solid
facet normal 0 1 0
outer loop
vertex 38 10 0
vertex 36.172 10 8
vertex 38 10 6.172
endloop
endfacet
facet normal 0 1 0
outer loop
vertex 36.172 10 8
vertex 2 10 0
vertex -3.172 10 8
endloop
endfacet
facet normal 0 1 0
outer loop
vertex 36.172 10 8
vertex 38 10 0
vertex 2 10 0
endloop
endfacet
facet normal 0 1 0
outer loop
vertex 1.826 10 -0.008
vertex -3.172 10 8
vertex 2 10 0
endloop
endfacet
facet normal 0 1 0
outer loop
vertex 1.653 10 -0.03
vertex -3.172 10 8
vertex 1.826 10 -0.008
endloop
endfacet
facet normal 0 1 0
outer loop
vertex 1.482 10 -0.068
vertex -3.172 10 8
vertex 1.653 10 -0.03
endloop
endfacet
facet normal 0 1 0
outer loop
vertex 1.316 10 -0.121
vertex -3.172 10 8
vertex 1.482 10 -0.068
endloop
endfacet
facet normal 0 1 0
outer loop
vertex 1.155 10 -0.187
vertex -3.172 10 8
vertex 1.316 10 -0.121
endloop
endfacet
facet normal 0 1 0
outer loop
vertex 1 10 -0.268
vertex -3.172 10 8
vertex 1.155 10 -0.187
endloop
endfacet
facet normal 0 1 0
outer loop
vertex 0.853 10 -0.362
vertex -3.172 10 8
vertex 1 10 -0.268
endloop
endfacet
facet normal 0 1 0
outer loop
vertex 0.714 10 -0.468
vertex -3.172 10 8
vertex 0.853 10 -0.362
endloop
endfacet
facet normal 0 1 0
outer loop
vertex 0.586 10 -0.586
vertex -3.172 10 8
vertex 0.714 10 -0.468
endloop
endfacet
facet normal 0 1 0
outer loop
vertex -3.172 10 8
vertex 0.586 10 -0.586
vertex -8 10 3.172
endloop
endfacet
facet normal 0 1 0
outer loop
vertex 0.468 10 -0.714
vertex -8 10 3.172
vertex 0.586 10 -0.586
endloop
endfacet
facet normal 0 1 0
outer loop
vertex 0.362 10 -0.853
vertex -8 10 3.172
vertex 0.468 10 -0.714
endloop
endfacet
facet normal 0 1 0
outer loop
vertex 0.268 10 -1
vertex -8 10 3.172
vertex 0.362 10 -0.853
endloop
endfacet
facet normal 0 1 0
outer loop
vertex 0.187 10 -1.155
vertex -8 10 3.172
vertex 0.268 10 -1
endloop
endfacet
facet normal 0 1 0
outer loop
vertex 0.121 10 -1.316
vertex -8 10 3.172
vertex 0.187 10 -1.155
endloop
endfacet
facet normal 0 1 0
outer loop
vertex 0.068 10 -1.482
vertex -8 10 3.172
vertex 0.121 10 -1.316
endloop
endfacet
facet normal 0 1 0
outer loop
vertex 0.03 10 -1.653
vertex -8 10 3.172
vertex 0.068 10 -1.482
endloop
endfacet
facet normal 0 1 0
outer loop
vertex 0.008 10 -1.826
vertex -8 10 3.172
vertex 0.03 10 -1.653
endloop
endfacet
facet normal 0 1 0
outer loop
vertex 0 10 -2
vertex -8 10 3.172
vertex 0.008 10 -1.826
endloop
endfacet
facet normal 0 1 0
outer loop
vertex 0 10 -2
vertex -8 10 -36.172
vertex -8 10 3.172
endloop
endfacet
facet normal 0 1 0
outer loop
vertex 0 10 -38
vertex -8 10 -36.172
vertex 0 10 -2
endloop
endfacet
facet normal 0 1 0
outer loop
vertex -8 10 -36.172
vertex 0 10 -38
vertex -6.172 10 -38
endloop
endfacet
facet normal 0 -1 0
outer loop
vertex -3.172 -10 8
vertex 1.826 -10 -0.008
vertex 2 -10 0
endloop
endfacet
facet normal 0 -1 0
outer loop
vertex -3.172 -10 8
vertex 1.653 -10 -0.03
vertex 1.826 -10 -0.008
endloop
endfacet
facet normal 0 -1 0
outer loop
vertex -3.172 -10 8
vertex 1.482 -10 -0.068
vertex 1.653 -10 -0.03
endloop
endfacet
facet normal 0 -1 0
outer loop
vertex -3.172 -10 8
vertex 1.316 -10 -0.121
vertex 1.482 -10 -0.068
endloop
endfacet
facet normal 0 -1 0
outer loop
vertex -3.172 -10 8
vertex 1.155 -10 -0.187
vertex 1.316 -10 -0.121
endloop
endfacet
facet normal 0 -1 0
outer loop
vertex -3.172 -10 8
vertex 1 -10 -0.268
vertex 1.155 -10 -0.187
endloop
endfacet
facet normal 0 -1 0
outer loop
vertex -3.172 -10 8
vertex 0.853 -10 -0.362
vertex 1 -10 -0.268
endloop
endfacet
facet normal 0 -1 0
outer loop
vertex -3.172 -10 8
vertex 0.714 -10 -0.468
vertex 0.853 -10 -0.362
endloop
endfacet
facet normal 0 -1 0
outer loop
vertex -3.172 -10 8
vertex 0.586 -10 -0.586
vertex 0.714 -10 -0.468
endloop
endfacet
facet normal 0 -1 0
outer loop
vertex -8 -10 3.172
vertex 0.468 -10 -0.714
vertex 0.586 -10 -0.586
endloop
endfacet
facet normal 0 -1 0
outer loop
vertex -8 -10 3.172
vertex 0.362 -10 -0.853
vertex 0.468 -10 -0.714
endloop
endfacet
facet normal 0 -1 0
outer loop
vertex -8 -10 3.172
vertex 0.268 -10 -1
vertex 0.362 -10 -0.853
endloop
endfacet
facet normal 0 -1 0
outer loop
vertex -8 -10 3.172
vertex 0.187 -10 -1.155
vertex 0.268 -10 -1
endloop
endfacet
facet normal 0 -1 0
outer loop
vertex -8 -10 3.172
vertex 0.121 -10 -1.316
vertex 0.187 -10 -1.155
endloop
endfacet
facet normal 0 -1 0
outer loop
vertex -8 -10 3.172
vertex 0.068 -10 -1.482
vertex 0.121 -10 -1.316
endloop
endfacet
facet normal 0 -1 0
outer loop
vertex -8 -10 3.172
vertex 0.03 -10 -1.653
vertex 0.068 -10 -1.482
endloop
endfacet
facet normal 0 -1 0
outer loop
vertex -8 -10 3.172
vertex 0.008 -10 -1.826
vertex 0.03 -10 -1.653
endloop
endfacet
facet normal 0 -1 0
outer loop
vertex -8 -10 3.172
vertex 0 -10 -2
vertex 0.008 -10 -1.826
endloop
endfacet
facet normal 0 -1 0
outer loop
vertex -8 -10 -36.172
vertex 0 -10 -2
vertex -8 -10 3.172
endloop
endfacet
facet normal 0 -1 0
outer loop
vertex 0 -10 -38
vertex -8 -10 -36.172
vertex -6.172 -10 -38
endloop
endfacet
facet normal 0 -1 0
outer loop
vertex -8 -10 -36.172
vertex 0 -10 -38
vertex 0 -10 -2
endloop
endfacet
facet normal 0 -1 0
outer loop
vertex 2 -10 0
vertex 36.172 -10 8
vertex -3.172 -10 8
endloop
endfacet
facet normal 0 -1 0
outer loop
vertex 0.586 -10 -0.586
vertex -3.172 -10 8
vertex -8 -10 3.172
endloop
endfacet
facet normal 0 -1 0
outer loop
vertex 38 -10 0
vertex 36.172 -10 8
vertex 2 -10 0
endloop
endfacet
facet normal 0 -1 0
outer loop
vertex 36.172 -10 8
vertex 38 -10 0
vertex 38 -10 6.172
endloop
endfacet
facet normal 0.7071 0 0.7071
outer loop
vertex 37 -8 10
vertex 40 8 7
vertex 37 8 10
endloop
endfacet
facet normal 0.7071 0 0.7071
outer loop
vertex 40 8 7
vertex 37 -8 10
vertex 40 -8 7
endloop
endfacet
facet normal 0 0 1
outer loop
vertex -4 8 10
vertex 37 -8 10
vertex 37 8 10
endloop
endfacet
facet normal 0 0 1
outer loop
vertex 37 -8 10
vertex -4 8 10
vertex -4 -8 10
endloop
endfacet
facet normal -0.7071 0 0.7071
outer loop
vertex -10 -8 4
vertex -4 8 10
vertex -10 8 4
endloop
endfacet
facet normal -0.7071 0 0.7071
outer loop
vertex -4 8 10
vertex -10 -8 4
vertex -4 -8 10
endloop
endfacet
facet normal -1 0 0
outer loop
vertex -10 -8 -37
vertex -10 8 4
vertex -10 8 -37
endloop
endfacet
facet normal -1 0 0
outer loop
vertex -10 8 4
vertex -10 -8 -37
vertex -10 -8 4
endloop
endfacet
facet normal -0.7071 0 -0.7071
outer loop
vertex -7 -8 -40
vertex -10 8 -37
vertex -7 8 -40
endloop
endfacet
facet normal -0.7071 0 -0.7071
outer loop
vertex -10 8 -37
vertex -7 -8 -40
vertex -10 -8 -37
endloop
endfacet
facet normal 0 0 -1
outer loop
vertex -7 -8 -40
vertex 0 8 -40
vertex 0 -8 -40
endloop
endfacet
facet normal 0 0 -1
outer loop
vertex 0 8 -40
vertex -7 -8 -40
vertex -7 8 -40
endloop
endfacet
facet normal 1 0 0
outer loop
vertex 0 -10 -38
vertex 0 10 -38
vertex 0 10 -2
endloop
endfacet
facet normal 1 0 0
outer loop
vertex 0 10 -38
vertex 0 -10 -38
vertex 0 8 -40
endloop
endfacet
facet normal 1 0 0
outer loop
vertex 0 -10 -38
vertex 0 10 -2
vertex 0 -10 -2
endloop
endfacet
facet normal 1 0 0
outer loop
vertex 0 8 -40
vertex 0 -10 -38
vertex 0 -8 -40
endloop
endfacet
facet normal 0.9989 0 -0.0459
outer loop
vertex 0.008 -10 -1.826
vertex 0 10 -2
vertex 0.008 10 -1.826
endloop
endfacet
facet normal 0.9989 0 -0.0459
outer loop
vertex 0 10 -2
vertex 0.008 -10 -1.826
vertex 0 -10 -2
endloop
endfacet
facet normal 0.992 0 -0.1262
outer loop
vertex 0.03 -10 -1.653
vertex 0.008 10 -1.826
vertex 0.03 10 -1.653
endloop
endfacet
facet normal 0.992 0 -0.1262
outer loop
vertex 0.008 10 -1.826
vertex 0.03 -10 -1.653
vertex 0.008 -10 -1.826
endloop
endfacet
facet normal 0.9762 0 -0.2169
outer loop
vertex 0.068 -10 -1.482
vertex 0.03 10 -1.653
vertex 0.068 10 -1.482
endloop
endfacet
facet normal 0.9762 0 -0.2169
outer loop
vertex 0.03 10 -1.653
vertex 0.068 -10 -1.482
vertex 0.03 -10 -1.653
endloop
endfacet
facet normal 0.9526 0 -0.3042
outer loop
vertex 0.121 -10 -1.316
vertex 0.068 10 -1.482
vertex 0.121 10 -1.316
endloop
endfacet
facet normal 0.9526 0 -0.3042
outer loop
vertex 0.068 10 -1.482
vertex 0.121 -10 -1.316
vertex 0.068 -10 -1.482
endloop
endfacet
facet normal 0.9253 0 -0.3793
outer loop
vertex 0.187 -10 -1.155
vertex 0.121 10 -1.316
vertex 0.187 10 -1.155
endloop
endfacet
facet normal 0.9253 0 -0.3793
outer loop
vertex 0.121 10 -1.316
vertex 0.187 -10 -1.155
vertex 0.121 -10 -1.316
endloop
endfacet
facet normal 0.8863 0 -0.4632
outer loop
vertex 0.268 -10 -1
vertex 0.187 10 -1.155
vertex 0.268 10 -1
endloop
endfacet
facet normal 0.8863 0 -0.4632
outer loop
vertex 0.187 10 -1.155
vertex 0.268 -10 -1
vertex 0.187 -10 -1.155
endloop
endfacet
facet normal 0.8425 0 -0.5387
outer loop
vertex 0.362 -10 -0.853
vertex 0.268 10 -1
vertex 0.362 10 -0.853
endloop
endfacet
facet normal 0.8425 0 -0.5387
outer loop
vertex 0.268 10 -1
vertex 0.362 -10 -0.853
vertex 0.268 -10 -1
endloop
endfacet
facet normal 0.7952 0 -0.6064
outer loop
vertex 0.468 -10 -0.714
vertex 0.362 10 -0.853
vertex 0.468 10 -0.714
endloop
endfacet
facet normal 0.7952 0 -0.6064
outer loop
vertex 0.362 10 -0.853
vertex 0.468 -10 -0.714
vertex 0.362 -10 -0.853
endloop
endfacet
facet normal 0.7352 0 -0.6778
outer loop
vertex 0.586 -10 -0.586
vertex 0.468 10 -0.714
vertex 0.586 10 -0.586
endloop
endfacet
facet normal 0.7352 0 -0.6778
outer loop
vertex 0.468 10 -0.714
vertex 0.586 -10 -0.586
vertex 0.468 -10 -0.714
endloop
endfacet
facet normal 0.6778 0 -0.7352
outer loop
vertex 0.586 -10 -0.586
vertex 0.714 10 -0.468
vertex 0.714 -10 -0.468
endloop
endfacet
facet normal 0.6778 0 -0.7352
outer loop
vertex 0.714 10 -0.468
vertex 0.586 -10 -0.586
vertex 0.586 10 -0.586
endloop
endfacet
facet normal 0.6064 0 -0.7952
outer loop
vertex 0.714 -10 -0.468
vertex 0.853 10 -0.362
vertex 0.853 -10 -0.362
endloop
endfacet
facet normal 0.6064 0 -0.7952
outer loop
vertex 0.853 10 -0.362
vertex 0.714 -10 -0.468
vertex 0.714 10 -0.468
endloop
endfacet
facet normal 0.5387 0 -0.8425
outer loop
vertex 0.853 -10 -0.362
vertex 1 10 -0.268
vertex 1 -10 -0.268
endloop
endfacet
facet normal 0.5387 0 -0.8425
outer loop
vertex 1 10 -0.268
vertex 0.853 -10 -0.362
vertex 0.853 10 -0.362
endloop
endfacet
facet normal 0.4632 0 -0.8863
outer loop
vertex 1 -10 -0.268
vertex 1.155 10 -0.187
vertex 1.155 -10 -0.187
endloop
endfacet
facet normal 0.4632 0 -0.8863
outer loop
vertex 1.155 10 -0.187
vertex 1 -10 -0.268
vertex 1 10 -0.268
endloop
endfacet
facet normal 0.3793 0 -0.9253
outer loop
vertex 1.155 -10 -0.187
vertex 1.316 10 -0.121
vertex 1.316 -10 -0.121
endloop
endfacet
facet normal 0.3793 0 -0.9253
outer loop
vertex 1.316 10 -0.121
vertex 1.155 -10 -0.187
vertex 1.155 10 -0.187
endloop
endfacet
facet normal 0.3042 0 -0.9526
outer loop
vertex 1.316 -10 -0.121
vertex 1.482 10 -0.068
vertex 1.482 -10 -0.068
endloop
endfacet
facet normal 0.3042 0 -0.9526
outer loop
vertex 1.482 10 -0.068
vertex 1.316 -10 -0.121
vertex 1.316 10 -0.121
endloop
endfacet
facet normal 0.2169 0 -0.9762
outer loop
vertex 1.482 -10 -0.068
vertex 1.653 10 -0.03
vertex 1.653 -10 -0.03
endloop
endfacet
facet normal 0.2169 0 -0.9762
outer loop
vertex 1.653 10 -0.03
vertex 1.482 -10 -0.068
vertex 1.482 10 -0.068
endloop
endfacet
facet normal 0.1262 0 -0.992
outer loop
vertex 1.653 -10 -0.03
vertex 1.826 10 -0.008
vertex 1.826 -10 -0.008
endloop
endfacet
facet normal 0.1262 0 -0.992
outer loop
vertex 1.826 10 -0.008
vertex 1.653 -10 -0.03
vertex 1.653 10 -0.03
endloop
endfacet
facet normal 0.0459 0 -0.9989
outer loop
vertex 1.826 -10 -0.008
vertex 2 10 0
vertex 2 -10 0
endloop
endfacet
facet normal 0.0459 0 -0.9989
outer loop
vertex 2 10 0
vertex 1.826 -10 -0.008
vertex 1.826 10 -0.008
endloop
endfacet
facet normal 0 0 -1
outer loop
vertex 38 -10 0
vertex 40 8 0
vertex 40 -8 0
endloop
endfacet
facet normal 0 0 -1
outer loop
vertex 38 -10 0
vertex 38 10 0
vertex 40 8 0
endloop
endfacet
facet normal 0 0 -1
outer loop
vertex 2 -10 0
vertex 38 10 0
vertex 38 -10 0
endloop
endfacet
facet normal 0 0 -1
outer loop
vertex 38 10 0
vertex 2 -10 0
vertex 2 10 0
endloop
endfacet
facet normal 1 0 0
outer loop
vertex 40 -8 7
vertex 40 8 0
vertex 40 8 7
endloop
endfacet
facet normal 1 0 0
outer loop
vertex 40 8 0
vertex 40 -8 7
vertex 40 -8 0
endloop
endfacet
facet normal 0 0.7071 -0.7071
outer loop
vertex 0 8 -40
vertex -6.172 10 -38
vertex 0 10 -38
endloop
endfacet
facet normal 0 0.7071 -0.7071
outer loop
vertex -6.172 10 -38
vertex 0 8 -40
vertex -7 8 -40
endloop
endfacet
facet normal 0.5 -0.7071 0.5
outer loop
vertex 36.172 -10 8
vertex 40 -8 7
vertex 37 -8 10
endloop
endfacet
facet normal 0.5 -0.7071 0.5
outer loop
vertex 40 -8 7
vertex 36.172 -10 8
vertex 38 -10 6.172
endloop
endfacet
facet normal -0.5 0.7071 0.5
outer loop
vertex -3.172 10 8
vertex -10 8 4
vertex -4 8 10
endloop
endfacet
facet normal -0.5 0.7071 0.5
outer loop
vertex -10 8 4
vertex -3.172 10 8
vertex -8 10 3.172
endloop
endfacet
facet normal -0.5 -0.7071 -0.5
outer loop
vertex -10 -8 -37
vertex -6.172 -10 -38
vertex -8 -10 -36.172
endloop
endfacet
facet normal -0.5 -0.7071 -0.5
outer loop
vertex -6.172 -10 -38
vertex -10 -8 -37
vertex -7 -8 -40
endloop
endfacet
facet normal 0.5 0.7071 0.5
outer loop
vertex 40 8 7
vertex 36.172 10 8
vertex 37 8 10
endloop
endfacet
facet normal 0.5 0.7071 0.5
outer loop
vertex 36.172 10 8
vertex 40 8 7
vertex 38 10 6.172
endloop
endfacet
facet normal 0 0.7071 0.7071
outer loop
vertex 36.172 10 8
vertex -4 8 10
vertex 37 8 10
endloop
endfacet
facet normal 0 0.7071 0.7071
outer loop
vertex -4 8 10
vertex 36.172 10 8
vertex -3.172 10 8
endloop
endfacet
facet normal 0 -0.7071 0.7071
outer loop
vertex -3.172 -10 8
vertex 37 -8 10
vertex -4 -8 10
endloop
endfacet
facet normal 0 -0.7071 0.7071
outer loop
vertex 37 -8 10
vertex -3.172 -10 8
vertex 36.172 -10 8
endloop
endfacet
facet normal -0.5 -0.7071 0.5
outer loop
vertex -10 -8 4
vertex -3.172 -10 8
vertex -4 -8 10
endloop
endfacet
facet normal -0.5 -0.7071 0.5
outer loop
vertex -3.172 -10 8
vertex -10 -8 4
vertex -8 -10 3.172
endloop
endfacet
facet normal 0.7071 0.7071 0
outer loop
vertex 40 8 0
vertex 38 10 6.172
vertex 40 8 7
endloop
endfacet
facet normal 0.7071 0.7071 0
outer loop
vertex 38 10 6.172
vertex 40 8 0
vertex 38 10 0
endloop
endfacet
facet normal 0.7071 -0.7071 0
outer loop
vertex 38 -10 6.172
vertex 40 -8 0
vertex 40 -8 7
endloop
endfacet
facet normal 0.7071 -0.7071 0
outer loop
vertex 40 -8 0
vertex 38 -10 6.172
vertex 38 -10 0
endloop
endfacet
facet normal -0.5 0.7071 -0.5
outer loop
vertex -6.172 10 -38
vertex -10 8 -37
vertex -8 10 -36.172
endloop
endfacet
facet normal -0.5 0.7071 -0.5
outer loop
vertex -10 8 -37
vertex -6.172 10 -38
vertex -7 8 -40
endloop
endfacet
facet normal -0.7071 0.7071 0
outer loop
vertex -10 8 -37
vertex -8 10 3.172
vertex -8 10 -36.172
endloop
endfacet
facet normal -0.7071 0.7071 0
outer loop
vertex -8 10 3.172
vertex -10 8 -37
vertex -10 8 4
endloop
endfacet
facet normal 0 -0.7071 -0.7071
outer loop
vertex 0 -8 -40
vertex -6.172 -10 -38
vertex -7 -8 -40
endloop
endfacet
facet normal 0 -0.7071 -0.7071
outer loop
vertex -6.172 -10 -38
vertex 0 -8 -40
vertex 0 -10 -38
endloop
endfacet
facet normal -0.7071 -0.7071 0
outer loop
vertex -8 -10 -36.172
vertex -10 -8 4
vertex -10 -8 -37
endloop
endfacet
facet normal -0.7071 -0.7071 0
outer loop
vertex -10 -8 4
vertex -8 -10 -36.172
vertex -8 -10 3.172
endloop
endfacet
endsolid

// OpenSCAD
// Corner Bracket: unified L-profile elephant-foot experiment.
//
// The ef input is ONE continuous L-shaped profile following the complete
// inside of the bracket:
//
//   horizontal inside face
//        -> rounded inside corner r_in
//        -> vertical inside face
//
// No horizontal/vertical split is shown in this explanation.

/* [Demo] */
scene = "00_cs_body"; // [00_cs_body, 01_inner_L_profile, 02_inner_L_sheet, 03_inner_L_with_body]

/* [Geometry] */
armH = 40;
armV = 40;
t = 10;
W = 20;
ce = 6;
c = 3;
cs = 2;
ef = 0.6;
r_in = 2.0;

/* [Hidden] */
$fn = 72;
sheet_thickness = 0.35;

// -----------------------------------------------------------------------------
// Clean bracket geometry, NO ef.
// -----------------------------------------------------------------------------

module inside_corner_2d(r) {
    difference() {
        translate([0, -r]) square([r, r]);
        translate([r, -r]) circle(r = r, $fn = 72);
    }
}

module profile_2d() {
    union() {
        polygon([
            [armH, 0],
            [armH, t - c],
            [armH - c, t],
            [-t + ce, t],
            [-t, t - ce],
            [-t, -armV + c],
            [-t + c, -armV],
            [0, -armV],
            [0, 0]
        ]);

        if (r_in > 0)
            inside_corner_2d(r_in);
    }
}

module outer_shape_2d() {
    polygon([
        [armH, -armV],
        [armH, t - c],
        [armH - c, t],
        [-t + ce, t],
        [-t, t - ce],
        [-t, -armV + c],
        [-t + c, -armV]
    ]);
}

module raw_body() {
    rotate([90, 0, 0])
        linear_extrude(height = W, center = true)
            profile_2d();
}

module cs_envelope() {
    rotate([90, 0, 0])
        hull() {
            linear_extrude(height = W - 2 * cs, center = true)
                outer_shape_2d();

            linear_extrude(height = W, center = true)
                offset(delta = -cs)
                    outer_shape_2d();
        }
}

module cs_body() {
    intersection() {
        raw_body();
        cs_envelope();
    }
}

// -----------------------------------------------------------------------------
// ONE continuous inner L profile, including the rounded inside corner.
//
// This is deliberately constructed as a thin 2D band along the complete
// wood-contact boundary. It is only an explanatory input shape for now.
// -----------------------------------------------------------------------------

module inner_path_opening_2d() {
    reach = max(armH, armV) + 10;

    difference() {
        translate([0, -armV - 5])
            square([armH + 5, armV + 10]);

        if (r_in > 0)
            inside_corner_2d(r_in);
    }
}

// Thin band following the full inside boundary:
// horizontal -> rounded corner -> vertical.
module inner_L_profile_2d() {
    difference() {
        offset(delta = sheet_thickness)
            inner_path_opening_2d();

        inner_path_opening_2d();
    }
}

// Clip the explanatory band to the real bracket extents.
module clipped_inner_L_profile_2d() {
    intersection() {
        inner_L_profile_2d();

        translate([-sheet_thickness, -armV])
            square([armH + sheet_thickness, armV + sheet_thickness]);
    }
}

// Extrude the one-piece L profile over the bracket width.
// In front view this reads as one bent sheet with the real rounded corner.
module inner_L_sheet() {
    rotate([90, 0, 0])
        linear_extrude(height = W, center = true)
            clipped_inner_L_profile_2d();
}

// -----------------------------------------------------------------------------
// Scenes.
// -----------------------------------------------------------------------------

$vpr = [90, 0, 0];

if (scene == "00_cs_body") {
    color("SteelBlue")
        cs_body();
}

else if (scene == "01_inner_L_profile") {
    color("DeepSkyBlue")
        clipped_inner_L_profile_2d();
}

else if (scene == "02_inner_L_sheet") {
    color("DeepSkyBlue", 0.88)
        inner_L_sheet();
}

else {
    color("DeepSkyBlue", 0.80)
        inner_L_sheet();

    color("DarkOrange", 0.24)
        cs_body();
}
